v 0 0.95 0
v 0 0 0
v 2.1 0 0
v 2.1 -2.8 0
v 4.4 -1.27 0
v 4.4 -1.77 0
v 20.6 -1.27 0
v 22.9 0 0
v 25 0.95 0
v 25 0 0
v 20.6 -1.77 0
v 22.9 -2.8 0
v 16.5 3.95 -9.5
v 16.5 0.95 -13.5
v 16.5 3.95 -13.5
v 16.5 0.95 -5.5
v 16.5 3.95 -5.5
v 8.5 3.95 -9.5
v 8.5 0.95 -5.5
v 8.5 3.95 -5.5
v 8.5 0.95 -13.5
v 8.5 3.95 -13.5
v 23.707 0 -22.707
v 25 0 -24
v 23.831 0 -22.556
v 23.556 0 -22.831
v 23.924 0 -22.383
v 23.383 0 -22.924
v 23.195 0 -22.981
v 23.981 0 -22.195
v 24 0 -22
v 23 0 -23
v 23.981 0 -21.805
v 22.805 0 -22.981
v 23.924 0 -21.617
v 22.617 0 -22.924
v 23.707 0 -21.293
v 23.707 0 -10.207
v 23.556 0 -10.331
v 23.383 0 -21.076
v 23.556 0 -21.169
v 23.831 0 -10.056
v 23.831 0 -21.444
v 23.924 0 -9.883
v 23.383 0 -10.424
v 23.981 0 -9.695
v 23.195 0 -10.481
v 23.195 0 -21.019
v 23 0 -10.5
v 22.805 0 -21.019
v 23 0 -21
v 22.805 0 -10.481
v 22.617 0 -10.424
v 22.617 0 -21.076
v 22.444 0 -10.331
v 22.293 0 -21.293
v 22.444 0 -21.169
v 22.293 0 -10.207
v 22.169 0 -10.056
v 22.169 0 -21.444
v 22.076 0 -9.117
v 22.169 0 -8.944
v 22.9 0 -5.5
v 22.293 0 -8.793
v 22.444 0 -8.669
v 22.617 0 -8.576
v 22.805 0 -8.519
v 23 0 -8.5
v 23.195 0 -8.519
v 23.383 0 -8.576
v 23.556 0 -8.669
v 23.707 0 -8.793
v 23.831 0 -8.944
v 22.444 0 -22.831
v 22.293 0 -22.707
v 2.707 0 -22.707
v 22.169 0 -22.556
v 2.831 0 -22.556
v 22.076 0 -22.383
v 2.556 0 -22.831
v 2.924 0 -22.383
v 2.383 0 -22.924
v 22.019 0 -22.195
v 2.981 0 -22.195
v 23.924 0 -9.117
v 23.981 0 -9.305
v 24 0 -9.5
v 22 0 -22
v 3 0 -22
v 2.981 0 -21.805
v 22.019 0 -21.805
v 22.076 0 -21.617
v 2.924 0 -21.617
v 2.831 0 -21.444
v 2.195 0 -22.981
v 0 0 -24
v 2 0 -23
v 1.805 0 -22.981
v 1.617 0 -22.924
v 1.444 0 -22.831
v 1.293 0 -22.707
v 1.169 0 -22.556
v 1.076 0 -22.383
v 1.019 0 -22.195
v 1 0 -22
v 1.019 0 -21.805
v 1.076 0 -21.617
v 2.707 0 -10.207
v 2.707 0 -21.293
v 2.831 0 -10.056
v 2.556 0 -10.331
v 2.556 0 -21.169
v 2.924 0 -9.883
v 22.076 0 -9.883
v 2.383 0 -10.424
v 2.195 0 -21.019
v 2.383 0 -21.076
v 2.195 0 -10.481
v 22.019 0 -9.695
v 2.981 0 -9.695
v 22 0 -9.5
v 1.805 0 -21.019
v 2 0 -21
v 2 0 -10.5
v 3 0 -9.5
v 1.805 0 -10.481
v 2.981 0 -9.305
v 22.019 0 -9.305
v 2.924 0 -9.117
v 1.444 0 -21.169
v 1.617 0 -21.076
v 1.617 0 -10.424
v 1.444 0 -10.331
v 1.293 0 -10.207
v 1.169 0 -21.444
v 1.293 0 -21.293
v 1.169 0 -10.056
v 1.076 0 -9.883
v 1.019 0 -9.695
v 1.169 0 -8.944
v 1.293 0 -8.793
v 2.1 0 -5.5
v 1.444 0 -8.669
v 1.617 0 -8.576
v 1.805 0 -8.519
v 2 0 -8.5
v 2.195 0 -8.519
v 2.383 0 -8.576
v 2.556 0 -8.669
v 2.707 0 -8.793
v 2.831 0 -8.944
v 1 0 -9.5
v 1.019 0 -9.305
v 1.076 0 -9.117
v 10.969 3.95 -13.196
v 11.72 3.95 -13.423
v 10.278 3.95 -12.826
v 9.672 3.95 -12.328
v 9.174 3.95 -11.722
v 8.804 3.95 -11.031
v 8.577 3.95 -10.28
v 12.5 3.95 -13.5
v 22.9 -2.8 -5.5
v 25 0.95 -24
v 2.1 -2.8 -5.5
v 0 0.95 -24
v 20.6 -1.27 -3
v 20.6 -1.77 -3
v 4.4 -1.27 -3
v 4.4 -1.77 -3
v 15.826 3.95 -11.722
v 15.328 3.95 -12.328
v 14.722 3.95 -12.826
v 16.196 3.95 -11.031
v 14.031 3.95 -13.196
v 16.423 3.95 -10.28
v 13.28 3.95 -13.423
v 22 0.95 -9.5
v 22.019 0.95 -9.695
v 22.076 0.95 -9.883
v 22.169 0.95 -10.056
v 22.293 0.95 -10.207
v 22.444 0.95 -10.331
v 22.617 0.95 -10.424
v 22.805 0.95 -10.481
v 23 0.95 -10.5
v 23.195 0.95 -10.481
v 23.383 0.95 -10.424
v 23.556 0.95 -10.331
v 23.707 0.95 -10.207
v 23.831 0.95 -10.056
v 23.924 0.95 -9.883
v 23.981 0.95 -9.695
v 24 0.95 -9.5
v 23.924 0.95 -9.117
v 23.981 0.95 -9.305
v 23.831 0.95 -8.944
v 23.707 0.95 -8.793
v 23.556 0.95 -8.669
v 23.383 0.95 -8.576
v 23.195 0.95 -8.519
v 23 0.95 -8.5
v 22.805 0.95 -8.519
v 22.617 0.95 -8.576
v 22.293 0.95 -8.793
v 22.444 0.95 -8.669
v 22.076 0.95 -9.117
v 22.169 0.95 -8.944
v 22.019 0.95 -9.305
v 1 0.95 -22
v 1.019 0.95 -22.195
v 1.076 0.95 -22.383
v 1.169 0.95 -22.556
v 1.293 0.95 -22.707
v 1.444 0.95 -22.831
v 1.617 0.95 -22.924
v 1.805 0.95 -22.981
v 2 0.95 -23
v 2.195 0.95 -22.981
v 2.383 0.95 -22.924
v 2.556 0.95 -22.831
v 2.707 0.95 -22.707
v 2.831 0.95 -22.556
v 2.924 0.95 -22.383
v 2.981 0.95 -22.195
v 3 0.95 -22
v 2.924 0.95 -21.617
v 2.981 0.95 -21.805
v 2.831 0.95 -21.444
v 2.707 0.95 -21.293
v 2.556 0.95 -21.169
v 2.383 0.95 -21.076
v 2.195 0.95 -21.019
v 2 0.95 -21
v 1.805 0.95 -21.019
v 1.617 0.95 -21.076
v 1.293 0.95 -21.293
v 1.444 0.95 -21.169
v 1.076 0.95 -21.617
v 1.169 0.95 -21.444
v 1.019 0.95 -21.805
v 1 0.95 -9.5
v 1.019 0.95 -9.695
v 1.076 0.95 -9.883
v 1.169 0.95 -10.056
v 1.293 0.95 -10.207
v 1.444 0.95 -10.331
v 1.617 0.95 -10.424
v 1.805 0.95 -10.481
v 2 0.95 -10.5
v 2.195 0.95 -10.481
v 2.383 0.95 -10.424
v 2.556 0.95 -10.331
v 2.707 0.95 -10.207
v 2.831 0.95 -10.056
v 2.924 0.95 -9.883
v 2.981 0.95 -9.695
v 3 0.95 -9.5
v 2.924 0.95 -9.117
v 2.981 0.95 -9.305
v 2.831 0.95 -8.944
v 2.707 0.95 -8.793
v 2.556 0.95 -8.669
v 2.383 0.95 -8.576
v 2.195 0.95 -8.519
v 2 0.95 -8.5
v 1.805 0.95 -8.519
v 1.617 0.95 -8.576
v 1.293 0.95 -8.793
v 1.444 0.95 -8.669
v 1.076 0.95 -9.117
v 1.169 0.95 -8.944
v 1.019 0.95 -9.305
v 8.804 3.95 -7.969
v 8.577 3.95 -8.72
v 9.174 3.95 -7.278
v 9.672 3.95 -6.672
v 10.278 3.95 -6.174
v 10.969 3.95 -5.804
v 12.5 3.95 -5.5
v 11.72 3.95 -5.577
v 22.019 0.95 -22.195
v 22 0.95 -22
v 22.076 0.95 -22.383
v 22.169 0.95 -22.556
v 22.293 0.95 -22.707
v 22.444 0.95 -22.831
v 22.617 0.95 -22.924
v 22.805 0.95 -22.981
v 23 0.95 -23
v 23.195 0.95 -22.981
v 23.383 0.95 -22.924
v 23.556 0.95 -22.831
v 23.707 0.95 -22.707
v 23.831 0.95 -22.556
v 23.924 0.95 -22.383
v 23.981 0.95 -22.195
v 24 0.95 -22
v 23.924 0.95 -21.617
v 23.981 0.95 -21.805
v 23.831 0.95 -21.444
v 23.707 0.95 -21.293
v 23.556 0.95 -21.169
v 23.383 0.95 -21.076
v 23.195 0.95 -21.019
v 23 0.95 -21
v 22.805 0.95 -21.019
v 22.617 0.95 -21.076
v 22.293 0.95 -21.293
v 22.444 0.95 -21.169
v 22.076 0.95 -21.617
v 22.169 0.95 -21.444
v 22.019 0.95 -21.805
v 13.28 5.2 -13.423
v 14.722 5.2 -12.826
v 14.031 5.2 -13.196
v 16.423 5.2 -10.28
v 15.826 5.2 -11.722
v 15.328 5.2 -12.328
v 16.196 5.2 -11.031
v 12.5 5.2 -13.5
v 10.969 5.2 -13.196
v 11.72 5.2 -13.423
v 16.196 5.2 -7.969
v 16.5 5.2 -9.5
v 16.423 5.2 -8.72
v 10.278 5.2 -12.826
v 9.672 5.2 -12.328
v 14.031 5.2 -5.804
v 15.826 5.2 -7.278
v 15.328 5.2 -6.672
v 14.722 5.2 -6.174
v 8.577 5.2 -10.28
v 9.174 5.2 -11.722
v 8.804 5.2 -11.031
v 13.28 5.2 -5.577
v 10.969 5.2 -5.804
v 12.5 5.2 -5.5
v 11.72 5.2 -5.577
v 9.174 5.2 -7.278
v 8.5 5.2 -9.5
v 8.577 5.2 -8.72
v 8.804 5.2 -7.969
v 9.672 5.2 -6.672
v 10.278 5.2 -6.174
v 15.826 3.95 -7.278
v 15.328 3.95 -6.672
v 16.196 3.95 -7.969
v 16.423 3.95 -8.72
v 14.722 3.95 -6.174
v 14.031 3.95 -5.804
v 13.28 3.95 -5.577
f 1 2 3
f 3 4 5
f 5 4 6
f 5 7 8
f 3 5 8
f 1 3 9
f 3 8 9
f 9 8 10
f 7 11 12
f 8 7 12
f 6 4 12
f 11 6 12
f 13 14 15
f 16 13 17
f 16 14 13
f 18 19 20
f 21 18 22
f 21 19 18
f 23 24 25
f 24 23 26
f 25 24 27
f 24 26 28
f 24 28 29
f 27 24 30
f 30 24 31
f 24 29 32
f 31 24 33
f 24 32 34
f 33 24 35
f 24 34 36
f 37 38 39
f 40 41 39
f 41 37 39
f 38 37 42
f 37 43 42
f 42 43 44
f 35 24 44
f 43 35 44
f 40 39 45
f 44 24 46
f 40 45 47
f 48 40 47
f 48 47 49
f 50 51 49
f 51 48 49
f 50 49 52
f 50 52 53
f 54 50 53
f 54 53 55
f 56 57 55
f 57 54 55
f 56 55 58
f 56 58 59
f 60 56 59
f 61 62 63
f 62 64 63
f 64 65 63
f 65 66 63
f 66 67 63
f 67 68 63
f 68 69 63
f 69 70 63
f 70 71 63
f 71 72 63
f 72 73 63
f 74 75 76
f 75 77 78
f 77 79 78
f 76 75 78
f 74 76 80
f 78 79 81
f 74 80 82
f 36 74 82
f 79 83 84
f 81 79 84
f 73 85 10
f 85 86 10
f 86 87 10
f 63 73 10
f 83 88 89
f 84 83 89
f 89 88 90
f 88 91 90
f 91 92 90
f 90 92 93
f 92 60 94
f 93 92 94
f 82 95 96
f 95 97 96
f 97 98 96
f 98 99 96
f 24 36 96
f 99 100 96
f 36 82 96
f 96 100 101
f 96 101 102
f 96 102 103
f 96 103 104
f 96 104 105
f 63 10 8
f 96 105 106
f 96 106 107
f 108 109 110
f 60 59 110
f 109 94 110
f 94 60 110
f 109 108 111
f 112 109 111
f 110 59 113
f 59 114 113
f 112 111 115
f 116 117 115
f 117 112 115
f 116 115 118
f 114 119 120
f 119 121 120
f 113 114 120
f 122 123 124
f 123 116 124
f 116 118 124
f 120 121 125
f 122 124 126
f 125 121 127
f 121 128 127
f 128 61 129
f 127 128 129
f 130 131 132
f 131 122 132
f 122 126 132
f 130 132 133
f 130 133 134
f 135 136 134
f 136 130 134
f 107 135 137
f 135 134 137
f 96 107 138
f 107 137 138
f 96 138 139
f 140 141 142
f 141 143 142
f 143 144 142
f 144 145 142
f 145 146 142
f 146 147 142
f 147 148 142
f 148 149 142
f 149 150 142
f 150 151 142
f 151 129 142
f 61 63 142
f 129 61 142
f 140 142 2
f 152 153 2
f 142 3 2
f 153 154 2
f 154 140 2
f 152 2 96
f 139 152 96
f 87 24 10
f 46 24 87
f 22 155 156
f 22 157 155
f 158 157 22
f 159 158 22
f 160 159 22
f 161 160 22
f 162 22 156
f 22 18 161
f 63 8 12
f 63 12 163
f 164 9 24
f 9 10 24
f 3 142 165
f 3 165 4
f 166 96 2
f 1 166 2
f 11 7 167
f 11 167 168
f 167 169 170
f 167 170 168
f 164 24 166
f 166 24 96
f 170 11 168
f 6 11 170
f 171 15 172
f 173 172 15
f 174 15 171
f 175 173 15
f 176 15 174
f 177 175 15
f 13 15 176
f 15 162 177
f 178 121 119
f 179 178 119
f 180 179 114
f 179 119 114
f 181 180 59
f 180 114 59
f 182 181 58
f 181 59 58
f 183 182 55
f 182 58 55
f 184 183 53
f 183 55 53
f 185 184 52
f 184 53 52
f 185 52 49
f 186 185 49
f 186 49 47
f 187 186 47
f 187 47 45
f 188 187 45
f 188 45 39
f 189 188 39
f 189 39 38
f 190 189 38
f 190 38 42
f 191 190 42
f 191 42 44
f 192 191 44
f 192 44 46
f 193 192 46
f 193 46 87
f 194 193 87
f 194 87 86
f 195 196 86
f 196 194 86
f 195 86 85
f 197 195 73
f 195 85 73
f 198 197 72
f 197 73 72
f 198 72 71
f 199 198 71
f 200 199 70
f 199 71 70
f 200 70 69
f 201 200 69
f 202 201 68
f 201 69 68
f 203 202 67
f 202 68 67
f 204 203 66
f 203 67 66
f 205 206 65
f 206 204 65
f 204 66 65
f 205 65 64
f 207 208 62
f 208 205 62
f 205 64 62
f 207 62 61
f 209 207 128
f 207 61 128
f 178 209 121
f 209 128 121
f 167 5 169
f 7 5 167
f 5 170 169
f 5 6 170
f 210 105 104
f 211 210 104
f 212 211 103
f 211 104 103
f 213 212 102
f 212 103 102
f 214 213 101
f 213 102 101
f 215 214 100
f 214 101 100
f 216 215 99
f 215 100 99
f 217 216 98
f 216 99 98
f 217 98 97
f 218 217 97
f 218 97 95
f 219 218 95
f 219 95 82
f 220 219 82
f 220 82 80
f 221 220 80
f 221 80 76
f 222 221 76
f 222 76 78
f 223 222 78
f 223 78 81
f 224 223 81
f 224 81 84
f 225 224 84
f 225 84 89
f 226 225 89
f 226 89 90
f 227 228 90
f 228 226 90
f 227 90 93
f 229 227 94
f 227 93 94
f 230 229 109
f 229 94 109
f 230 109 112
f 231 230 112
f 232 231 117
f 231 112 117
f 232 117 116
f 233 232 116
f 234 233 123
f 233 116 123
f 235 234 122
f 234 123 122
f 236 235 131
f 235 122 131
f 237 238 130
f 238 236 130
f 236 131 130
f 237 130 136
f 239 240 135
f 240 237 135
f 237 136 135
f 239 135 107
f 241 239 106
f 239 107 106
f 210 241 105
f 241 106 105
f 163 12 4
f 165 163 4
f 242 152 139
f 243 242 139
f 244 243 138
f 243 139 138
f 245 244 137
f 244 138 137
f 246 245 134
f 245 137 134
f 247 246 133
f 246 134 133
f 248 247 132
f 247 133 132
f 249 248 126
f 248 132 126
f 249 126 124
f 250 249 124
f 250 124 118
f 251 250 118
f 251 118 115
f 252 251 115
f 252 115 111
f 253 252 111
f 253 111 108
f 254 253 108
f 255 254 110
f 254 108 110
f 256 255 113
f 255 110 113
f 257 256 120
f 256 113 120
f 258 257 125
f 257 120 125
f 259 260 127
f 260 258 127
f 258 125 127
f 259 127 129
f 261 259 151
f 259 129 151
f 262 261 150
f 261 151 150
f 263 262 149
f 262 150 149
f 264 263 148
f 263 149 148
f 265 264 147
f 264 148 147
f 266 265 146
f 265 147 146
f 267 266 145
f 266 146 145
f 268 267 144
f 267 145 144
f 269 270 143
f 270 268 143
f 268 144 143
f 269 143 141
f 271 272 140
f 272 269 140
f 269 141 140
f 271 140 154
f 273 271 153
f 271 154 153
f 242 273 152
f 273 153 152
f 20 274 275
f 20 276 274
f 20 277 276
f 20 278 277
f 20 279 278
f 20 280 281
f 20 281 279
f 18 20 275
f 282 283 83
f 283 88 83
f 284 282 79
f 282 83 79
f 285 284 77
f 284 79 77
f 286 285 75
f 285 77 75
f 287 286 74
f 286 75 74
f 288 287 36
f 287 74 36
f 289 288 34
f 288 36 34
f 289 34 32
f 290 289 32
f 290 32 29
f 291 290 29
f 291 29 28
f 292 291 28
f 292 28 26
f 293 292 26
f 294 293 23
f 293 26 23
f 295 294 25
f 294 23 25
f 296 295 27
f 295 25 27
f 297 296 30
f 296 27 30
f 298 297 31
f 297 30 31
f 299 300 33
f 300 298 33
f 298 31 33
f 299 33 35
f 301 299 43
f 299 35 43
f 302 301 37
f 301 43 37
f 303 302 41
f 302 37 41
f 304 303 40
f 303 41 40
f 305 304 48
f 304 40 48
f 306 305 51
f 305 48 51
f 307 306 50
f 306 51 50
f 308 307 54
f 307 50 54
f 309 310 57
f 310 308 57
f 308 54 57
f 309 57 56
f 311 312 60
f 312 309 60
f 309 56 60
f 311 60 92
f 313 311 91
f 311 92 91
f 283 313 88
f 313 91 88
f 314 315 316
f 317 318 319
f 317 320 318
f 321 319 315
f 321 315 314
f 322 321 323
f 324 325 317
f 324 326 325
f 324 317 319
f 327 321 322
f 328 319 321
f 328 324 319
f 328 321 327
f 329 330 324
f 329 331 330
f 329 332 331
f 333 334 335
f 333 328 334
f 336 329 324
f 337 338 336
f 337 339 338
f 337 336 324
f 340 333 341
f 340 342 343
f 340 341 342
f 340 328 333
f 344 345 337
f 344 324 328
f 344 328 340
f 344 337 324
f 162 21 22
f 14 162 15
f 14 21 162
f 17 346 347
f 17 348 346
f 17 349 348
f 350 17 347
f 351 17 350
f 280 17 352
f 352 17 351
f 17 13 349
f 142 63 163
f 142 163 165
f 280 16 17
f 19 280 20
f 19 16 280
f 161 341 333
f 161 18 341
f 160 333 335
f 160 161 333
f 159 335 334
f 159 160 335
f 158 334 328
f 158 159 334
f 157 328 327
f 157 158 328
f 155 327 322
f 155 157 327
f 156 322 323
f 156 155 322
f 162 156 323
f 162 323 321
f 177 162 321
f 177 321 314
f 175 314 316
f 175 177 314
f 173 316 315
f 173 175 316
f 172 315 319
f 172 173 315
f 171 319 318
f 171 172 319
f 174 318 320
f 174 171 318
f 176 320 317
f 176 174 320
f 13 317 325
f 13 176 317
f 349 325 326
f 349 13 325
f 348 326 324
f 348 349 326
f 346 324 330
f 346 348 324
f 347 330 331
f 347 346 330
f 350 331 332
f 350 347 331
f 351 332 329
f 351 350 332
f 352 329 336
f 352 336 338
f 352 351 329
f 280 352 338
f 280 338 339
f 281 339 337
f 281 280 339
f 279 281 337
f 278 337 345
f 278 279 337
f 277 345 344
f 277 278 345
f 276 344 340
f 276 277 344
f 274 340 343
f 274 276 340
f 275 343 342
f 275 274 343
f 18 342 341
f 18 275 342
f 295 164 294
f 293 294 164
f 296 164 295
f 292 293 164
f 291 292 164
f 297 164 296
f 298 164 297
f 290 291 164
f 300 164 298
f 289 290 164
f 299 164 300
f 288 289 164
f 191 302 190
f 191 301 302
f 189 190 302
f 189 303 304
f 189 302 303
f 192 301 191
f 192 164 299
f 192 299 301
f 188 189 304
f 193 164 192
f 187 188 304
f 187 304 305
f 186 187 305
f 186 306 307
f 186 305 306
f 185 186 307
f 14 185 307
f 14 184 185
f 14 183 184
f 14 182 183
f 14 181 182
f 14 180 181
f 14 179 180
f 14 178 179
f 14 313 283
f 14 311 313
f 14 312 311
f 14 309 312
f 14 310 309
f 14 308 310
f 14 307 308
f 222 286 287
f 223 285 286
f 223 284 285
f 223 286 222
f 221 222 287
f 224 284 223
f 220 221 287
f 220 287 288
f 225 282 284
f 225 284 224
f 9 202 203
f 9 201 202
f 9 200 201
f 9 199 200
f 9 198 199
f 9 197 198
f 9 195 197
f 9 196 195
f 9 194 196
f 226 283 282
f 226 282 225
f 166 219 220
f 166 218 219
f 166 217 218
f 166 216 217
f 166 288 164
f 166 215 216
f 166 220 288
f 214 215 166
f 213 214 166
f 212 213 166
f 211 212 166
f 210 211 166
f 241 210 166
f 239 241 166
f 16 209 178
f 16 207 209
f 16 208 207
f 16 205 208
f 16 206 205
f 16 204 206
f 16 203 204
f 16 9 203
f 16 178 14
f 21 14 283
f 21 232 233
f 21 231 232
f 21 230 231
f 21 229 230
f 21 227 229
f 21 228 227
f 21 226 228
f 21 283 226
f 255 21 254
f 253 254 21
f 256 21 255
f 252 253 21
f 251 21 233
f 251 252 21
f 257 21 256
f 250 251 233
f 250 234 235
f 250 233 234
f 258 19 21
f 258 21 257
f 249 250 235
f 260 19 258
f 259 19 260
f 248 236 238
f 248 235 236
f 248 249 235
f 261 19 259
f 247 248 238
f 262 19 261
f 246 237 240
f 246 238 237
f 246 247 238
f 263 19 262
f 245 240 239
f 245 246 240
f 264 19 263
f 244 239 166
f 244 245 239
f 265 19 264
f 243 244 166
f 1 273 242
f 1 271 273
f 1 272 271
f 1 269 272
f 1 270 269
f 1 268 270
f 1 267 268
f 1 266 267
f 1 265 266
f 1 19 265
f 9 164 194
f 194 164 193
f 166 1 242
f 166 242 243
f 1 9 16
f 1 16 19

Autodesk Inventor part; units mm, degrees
ref_plane "YZ Plane" through (0, 0, 0) normal (1, 0, 0) x (0, 1, 0)
ref_plane "XZ Plane" through (0, 0, 0) normal (0, 1, 0) x (-1, 0, 0)
ref_plane "XY Plane" through (0, 0, 0) normal (0, 0, 1) x (1, 0, 0)
sketch "스케치1" plane through (0, 0, 0) normal (0, 1, 0) x (-1, 0, 0)
  line L0 (0, 0) -> (-25, 0)
  line L1 (-25, 0) -> (-25, -24)
  line L2 (-25, -24) -> (0, -24)
  line L3 (0, -24) -> (0, 0)
  circle A0 centre (-2, -22) radius 1
  circle A1 centre (-23, -22) radius 1
  circle A2 centre (-23, -9.5) radius 1
  circle A3 centre (-2, -9.5) radius 1
  line L4 (-8.5, -13.5) -> (-16.5, -13.5)
  line L5 (-16.5, -13.5) -> (-16.5, -5.5)
  line L6 (-16.5, -5.5) -> (-8.5, -5.5)
  line L7 (-8.5, -5.5) -> (-8.5, -13.5)
  circle A4 centre (-12.5, -9.5) radius 4
  line L8 (-2.1, 0) -> (-22.9, 0)
  line L9 (-22.9, 0) -> (-22.9, -5.5)
  line L10 (-22.9, -5.5) -> (-2.1, -5.5)
  line L11 (-2.1, -5.5) -> (-2.1, 0)
  point P0 (-12.5, 0)
  point P1 (-16.5, -9.5)
  point P2 (-12.5, -5.5)
  point P3 (-8.5, -9.5)
  point P4 (-12.5, -13.5)
  dimension "d0" = 25
  dimension "d1" = 24
  dimension "d2" = 2
  dimension "d3" = 2
  dimension "d4" = 2
  dimension "d5" = 2
  dimension "d6" = 2
  dimension "d8" = 2
  dimension "d9" = 2
  dimension "d10" = 2
  dimension "d12" = 2
  dimension "d15" = 12.5
  dimension "d16" = 9.5
  dimension "d17" = 2
  dimension "d18" = 12.5
  dimension "d19" = 9.5
  dimension "d20" = 8
  dimension "d21" = 8
  dimension "d22" = 8.5
  dimension "d23" = 8.5
  dimension "d24" = 5.5
  dimension "d25" = 21
  dimension "d26" = 8
  dimension "d27" = 20.8
  dimension "d28" = 5.5
extrude "돌출1" add sketch "스케치1" along normal blind 0.95 contours L3 L2 L1 L0 L9 L10 L5 L4 L7 L11 | L11 L10 L6 L9 L0
extrude "돌출2" add sketch "스케치1" along normal blind 3.95 contours L7 A4 L6 | L6 A4 L5 | L7 L4 A4 | A4 L4 L5
extrude "돌출3" add sketch "스케치1" along normal blind 5.2 contours A4
extrude "돌출4" add sketch "스케치1" against normal blind 2.8 contours L11 L10 L6 L9 L0
sketch "스케치2" plane through (0, 0.95, 0) normal (0, 0, 1) x (1, 0, 0)
  line L0 (4.4, -2.22) -> (20.6, -2.22)
  line L1 (20.6, -2.22) -> (20.6, -2.72)
  line L2 (20.6, -2.72) -> (4.4, -2.72)
  line L3 (4.4, -2.72) -> (4.4, -2.22)
  line L4 (0, -0.95) -> (2.1, -0.95) projected
  line L5 (2.1, -0.95) -> (2.1, -3.75) projected
  line L6 (22.9, -0.95) -> (22.9, -3.75) projected
  point P0 (4.4, -2.47)
  point P1 (20.6, -2.47)
  dimension "d37" = 16.2
  dimension "d38" = 0.5
  dimension "d39" = 1.27
  dimension "d40" = 2.3
  dimension "d41" = 2.3
  dimension "d42" = 2.1
extrude "돌출5" cut sketch "스케치2" against normal blind 3
properties part number "r_camera v2"
